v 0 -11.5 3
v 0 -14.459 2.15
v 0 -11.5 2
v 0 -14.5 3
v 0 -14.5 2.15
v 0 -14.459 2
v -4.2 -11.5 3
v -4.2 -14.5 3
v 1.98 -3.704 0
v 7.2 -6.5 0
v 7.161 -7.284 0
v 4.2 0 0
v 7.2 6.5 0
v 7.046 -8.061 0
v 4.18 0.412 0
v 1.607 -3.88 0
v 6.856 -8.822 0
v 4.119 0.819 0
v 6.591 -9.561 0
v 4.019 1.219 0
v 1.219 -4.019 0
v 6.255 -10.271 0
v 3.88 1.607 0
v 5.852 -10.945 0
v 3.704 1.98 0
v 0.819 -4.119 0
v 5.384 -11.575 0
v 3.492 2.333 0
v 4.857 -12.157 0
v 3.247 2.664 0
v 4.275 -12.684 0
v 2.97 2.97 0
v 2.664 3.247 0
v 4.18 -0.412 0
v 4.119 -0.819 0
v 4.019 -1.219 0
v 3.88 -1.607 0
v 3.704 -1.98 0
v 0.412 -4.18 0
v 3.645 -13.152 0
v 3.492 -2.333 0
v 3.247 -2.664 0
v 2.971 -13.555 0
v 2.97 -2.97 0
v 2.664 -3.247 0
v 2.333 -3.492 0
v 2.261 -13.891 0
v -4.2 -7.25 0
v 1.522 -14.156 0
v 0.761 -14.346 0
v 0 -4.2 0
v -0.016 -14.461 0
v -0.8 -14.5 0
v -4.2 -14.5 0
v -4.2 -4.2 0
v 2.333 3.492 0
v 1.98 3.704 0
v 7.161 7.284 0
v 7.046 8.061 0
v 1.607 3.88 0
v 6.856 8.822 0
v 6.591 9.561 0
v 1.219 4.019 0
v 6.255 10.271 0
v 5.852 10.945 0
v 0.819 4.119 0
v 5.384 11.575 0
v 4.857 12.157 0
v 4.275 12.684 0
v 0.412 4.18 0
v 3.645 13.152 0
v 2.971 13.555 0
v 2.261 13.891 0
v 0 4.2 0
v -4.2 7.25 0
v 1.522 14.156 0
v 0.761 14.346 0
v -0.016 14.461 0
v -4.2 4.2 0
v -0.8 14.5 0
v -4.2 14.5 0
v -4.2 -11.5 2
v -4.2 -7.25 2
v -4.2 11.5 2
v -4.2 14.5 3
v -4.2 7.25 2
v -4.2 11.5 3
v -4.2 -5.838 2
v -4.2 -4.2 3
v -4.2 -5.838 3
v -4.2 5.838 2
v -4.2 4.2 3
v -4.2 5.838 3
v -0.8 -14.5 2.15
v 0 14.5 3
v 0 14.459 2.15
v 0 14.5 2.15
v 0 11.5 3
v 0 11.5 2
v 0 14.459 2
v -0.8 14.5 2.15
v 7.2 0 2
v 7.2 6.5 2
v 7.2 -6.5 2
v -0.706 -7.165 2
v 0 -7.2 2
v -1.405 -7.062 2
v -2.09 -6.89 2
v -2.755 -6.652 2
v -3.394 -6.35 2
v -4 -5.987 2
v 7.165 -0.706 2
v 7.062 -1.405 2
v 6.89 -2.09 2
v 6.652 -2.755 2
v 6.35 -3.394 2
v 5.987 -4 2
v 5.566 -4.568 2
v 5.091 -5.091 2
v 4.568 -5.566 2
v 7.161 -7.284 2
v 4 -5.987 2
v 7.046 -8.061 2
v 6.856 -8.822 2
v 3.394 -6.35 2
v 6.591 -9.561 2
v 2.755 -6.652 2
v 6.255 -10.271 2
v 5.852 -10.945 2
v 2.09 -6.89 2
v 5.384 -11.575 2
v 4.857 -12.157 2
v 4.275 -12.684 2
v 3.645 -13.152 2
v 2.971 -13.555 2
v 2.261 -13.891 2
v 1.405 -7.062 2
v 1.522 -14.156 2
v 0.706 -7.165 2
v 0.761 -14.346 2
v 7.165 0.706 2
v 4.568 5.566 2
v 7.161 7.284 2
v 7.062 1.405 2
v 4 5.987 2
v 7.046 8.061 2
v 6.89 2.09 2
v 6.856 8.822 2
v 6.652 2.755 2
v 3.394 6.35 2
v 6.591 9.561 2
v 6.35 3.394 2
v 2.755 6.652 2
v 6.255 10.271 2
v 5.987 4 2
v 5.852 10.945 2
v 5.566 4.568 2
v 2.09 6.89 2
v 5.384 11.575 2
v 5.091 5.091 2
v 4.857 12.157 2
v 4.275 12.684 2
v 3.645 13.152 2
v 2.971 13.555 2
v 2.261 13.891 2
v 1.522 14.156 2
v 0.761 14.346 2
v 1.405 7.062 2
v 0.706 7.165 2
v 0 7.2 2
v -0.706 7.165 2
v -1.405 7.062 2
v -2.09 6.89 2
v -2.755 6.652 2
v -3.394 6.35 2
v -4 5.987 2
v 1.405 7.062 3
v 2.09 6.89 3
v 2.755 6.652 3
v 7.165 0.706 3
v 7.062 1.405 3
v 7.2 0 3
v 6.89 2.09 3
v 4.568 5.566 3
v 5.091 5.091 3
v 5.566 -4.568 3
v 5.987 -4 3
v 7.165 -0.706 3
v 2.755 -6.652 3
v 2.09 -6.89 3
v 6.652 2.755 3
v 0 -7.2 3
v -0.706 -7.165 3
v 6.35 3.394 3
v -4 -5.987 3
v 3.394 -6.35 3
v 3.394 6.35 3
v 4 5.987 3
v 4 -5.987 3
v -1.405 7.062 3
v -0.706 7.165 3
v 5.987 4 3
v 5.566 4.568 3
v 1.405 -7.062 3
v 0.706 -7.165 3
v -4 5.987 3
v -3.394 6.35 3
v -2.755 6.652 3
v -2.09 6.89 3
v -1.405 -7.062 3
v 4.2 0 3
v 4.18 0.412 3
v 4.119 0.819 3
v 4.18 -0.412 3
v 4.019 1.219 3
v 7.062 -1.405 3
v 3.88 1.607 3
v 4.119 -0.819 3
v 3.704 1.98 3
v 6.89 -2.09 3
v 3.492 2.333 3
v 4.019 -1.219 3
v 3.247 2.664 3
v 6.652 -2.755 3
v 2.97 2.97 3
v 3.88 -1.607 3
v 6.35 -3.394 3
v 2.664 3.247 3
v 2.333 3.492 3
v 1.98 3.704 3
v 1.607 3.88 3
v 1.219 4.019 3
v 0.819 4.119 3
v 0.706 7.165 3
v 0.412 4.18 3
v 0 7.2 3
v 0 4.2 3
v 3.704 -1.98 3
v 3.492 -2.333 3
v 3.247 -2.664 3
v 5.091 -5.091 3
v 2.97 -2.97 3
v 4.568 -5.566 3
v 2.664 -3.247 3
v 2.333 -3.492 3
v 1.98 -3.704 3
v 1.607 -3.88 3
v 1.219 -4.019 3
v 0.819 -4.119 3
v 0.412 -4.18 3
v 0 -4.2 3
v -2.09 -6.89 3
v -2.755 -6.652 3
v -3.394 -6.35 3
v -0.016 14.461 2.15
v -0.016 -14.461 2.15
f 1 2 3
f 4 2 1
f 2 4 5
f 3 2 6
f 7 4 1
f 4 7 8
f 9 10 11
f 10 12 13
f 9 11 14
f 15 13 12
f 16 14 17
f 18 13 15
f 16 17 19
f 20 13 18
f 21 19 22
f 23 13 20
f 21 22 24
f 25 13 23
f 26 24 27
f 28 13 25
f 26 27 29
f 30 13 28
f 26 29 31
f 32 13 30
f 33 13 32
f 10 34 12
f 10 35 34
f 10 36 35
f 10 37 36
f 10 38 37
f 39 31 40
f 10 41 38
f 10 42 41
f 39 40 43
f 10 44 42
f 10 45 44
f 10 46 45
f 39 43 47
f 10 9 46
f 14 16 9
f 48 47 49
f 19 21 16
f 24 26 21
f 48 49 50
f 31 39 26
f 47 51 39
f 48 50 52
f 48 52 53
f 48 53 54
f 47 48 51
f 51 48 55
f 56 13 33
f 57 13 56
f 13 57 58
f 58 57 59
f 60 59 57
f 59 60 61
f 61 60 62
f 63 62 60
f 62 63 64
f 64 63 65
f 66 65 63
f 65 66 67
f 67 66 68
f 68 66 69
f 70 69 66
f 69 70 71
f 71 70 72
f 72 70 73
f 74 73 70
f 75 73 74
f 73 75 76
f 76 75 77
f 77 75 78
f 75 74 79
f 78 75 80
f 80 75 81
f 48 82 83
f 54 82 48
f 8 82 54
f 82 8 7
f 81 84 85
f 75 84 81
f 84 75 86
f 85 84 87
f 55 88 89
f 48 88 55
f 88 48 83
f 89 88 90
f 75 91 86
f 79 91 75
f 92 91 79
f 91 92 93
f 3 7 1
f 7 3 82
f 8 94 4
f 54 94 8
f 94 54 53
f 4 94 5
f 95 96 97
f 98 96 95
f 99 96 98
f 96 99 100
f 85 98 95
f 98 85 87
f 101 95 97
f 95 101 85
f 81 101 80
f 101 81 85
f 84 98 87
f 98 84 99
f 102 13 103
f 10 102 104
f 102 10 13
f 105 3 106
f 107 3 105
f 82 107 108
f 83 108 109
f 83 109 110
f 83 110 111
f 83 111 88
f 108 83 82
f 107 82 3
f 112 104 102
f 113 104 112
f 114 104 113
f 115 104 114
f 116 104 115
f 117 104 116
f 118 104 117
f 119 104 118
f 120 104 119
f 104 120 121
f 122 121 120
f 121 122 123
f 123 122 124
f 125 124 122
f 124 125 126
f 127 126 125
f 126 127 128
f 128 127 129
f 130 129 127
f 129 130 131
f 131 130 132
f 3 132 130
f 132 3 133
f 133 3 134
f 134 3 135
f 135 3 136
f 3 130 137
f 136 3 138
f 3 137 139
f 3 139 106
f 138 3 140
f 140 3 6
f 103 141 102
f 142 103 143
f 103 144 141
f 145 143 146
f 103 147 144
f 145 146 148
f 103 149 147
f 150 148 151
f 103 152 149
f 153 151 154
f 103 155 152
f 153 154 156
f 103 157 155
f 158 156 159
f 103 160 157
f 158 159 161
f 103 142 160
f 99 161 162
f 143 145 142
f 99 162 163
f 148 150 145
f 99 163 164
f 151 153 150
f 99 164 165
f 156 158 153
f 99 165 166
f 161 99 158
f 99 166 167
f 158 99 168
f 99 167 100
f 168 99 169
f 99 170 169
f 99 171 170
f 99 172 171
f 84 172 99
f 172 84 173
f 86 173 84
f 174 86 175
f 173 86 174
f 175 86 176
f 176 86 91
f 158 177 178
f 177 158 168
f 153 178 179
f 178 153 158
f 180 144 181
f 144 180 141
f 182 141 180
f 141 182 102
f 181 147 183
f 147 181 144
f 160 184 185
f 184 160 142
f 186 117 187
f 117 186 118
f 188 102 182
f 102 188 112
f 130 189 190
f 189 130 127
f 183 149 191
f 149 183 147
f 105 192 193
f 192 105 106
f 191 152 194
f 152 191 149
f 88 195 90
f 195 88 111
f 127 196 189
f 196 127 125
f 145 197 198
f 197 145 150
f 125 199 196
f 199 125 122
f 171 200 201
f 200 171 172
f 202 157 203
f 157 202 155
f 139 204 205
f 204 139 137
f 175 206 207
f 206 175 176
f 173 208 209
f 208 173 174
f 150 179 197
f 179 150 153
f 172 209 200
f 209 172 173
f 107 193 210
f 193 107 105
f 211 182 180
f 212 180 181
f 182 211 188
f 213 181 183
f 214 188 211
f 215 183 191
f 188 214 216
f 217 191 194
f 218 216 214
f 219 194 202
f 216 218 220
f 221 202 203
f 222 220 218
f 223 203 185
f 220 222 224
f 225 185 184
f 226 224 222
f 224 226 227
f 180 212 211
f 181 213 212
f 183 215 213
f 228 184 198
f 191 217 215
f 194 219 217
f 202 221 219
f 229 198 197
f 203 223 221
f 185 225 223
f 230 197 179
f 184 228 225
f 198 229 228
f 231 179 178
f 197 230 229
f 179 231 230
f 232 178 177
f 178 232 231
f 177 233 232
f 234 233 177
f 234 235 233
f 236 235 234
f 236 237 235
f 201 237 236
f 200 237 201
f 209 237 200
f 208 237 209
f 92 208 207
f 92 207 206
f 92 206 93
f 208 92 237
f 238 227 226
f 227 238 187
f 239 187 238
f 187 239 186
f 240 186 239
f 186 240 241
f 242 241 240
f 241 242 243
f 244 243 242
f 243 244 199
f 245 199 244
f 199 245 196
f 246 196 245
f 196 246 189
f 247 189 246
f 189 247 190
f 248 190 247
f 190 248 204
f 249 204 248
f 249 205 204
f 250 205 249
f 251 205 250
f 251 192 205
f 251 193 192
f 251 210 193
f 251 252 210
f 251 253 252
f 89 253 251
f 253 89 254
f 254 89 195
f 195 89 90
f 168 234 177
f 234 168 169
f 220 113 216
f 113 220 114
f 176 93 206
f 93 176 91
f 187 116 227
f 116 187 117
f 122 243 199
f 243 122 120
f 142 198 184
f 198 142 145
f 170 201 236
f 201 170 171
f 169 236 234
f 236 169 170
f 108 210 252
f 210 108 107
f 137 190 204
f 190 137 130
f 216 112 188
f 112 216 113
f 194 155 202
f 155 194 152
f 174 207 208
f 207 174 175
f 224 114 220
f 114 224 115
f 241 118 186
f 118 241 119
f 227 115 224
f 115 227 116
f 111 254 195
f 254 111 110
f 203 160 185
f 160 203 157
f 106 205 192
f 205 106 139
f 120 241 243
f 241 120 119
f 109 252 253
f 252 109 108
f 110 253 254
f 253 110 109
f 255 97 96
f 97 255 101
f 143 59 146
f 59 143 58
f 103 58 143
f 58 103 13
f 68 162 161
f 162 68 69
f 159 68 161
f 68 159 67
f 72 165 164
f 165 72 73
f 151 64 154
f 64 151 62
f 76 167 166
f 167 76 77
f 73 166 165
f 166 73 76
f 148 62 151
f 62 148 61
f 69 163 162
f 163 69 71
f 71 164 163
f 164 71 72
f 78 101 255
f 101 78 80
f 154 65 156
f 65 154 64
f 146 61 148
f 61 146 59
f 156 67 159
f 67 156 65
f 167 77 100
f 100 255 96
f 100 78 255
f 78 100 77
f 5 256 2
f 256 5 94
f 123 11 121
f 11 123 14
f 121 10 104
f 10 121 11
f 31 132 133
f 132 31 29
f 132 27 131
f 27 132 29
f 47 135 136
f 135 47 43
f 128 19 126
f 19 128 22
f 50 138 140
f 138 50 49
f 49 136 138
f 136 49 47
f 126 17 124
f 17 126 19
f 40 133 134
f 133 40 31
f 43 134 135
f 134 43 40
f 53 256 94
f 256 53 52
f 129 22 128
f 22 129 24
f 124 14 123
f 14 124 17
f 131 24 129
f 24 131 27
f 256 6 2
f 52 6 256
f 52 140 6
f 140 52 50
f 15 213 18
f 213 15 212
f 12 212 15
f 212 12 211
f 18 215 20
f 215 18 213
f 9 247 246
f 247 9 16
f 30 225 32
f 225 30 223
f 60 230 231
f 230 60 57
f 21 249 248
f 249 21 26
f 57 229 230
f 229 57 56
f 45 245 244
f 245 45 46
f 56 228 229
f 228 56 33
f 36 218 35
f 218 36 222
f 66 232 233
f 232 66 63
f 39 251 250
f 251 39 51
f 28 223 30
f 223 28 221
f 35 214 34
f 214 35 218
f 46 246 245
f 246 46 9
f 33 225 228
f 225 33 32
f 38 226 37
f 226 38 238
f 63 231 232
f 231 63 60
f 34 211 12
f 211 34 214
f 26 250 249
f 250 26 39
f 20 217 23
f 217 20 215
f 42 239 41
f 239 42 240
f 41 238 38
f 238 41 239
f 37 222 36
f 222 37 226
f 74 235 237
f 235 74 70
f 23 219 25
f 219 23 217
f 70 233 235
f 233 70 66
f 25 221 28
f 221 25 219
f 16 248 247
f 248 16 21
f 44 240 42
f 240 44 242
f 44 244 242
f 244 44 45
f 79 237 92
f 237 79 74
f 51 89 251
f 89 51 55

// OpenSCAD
// file: functions.scad
// PRUSA Mendel  
// Functions used in many files
// GNU GPL v3
// Josef Průša
// josefprusa@me.com
// prusadjs.cz
// http://www.reprap.org/wiki/Prusa_Mendel
// http://github.com/prusajr/PrusaMendel


module nut(d,h,horizontal=true){
cornerdiameter =  (d / 2) / cos (180 / 6);
cylinder(h = h, r = cornerdiameter, $fn = 6);
if(horizontal){
for(i = [1:6]){
	rotate([0,0,60*i]) translate([-cornerdiameter-0.2,0,0]) rotate([0,0,-45]) cube(size = [2,2,h]);
}}
}

// Based on nophead research
module polyhole(d,h) {
    n = max(round(2 * d),3);
    rotate([0,0,180])
        cylinder(h = h, r = (d / 2) / cos (180 / n), $fn = n);
}




module roundcorner(diameter){
	difference(){
		cube(size = [diameter,diameter,99], center = false);
		translate(v = [diameter, diameter, 0]) cylinder(h = 100, r=diameter, center=false,$fn = max(3*diameter,20));
	}
}

module t25_indent()
{
	union()
	{
		for(z=[-5:5])
			translate([0,-5,z*2.5])
				difference()
				{
					cube([30,10,1.25],center=true);
					translate([0, 5, 1.7])
						rotate([-45,0,0])
							cube([40,10,2],center=true);
					translate([0, 5, -1.7])
						rotate([45,0,0])
							cube([40,10,2],center=true);

				}
	}
}
// file: configuration.scad
// PRUSA Mendel  
// Configuration file
// GNU GPL v2
// Josef Pra
// josefprusa@me.com
// prusadjs.cz
// http://www.reprap.org/wiki/Prusa_Mendel
// http://github.com/prusajr/PrusaMendel


// PLEASE SELECT ONE OF THE CONFIGURATIONS BELOW
// BY UN-COMMENTING IT


variant=0; //0 for metric
//variant=1; //1 for SAE
if(variant==0){
echo("variant: metric");
}else if(variant==1){
echo("variant: sae");
} else{
echo("WARNING: INVALID CONFIGURATION");
}




vars=[
//[m8_dia,m8_nut, m4_dia, m4_nut, m3_dia, m3_nut, bush_dia, mot_shaft, bush_rod, bush_outerdia, bush_length, m5_dia, m5_nut]
[8.4, 14.8, 4.3,8.1, 3.3, 6.5, 11, 5.3, 8, 16, 11, 5.3,9.3],//metric - M3 nut was 7; M3 was 4.4
[9,15.7,5.5,10.6,5.5,10.6,11.5,5.3,7.9375,16,11,5.6, 10]//SAE
];


//BUSHING TYPE Can generate three versions
// 1 - regular old ones
// 2 - helical ones
// 3 - holders for brass or any other bought bushings
bushing_type = 2;


//Round corner diameter
round_corner_diameter = 8;


//Thin wall size
layer_height = 0.4;
perimeter_width_over_thicknes = 1.6;
infill_widht_over_thickness = 1.55;
thin_wall = 2*(perimeter_width_over_thicknes*layer_height+infill_widht_over_thickness*layer_height);
if(thin_wall<2){
	echo("Check thin wall size, its below 2mm!");
}
echo(thin_wall);


//DO NOT TOUCH THIS SECTION!
m8_diameter = vars[variant][0];
m8_nut_diameter = vars[variant][1];
m4_diameter = vars[variant][2];
m4_nut_diameter = vars[variant][3];
m3_diameter = vars[variant][4];
m3_nut_diameter = vars[variant][5];
bushing_diameter = vars[variant][6];
motor_shaft=vars[variant][7];
bushing_rodsize = vars[variant][8];
bushing_outerDiameter = vars[variant][9];
bushing_lenght = vars[variant][10];
m5_diameter = vars[variant][11];
m5_nut_diameter = vars[variant][12];



// MINI-HUXLEY VERSION (TODO, just place holder)
// include <configuration-huxley.scad>


// MEGA VERSION (TODO, just place holder)
// include <configuration-mega.scad>

// Gap between the X rods

x_rod_centres=70;
y_rod_centres=183;
belt_width=6;
belt_clamp_centres=18;
ptfe_diameter=4;
z_slot_width=3.5;

vertex_x_rod_1=[11.013,59.912];
vertex_x_rod_2=[40.274,9.249,0];
vertex_x_rod_gap=sqrt((vertex_x_rod_1.x-vertex_x_rod_2.x)*(vertex_x_rod_1.x-vertex_x_rod_2.x) +(vertex_x_rod_1.y-vertex_x_rod_2.y)*(vertex_x_rod_1.y-vertex_x_rod_2.y) );

// Some basic functions, probably should be somewhere else
module roundcorner(diameter){
	difference(){
		cube(size = [diameter,diameter,99], center = false);
		translate(v = [diameter, diameter, 0]) cylinder(h = 100, r=diameter, center=true);
	}
}

include <functions.scad>
// main file
include<configuration.scad>;
w=3;
l=0;
ir=m8_diameter/2;
or=11.5+w;
r=8;
height=2;
$fn=64;

module beltguide(){
	difference()
	{
		union()
		{
			translate([w/2,0,height/2]) cube([ir*2+w,or*2,height],center=true);
			translate([0,0,(height+1)/2]) cylinder(r=ir+w,h=height+1,center=true);
			for(i=[1,0])
			{
				mirror([0,i,0])translate([-ir,or-w,0]) cube([ir,w,height+1]);
			}
		}
		#translate([0,0,height/2]) cylinder(r=ir,h=height*2.1,center=true);
		translate([-(l+or+0.1)/2,0,height/2]) cube([l+or+0.1,ir*2,height*2.1],center=true);
		translate([-ir-w/2,0,height/2]) cube([w,or,height*2.1],center=true);
		for(i=[0,1])
		{
			mirror([0,i,0]) translate([ir+w-r,or-r,-0.05]) difference()
			{
				cube([r+0.1,r+0.1,height*1.1]);
				cylinder(r=r,h=height*1.1);
			}
		}
	}
}

beltguide();
